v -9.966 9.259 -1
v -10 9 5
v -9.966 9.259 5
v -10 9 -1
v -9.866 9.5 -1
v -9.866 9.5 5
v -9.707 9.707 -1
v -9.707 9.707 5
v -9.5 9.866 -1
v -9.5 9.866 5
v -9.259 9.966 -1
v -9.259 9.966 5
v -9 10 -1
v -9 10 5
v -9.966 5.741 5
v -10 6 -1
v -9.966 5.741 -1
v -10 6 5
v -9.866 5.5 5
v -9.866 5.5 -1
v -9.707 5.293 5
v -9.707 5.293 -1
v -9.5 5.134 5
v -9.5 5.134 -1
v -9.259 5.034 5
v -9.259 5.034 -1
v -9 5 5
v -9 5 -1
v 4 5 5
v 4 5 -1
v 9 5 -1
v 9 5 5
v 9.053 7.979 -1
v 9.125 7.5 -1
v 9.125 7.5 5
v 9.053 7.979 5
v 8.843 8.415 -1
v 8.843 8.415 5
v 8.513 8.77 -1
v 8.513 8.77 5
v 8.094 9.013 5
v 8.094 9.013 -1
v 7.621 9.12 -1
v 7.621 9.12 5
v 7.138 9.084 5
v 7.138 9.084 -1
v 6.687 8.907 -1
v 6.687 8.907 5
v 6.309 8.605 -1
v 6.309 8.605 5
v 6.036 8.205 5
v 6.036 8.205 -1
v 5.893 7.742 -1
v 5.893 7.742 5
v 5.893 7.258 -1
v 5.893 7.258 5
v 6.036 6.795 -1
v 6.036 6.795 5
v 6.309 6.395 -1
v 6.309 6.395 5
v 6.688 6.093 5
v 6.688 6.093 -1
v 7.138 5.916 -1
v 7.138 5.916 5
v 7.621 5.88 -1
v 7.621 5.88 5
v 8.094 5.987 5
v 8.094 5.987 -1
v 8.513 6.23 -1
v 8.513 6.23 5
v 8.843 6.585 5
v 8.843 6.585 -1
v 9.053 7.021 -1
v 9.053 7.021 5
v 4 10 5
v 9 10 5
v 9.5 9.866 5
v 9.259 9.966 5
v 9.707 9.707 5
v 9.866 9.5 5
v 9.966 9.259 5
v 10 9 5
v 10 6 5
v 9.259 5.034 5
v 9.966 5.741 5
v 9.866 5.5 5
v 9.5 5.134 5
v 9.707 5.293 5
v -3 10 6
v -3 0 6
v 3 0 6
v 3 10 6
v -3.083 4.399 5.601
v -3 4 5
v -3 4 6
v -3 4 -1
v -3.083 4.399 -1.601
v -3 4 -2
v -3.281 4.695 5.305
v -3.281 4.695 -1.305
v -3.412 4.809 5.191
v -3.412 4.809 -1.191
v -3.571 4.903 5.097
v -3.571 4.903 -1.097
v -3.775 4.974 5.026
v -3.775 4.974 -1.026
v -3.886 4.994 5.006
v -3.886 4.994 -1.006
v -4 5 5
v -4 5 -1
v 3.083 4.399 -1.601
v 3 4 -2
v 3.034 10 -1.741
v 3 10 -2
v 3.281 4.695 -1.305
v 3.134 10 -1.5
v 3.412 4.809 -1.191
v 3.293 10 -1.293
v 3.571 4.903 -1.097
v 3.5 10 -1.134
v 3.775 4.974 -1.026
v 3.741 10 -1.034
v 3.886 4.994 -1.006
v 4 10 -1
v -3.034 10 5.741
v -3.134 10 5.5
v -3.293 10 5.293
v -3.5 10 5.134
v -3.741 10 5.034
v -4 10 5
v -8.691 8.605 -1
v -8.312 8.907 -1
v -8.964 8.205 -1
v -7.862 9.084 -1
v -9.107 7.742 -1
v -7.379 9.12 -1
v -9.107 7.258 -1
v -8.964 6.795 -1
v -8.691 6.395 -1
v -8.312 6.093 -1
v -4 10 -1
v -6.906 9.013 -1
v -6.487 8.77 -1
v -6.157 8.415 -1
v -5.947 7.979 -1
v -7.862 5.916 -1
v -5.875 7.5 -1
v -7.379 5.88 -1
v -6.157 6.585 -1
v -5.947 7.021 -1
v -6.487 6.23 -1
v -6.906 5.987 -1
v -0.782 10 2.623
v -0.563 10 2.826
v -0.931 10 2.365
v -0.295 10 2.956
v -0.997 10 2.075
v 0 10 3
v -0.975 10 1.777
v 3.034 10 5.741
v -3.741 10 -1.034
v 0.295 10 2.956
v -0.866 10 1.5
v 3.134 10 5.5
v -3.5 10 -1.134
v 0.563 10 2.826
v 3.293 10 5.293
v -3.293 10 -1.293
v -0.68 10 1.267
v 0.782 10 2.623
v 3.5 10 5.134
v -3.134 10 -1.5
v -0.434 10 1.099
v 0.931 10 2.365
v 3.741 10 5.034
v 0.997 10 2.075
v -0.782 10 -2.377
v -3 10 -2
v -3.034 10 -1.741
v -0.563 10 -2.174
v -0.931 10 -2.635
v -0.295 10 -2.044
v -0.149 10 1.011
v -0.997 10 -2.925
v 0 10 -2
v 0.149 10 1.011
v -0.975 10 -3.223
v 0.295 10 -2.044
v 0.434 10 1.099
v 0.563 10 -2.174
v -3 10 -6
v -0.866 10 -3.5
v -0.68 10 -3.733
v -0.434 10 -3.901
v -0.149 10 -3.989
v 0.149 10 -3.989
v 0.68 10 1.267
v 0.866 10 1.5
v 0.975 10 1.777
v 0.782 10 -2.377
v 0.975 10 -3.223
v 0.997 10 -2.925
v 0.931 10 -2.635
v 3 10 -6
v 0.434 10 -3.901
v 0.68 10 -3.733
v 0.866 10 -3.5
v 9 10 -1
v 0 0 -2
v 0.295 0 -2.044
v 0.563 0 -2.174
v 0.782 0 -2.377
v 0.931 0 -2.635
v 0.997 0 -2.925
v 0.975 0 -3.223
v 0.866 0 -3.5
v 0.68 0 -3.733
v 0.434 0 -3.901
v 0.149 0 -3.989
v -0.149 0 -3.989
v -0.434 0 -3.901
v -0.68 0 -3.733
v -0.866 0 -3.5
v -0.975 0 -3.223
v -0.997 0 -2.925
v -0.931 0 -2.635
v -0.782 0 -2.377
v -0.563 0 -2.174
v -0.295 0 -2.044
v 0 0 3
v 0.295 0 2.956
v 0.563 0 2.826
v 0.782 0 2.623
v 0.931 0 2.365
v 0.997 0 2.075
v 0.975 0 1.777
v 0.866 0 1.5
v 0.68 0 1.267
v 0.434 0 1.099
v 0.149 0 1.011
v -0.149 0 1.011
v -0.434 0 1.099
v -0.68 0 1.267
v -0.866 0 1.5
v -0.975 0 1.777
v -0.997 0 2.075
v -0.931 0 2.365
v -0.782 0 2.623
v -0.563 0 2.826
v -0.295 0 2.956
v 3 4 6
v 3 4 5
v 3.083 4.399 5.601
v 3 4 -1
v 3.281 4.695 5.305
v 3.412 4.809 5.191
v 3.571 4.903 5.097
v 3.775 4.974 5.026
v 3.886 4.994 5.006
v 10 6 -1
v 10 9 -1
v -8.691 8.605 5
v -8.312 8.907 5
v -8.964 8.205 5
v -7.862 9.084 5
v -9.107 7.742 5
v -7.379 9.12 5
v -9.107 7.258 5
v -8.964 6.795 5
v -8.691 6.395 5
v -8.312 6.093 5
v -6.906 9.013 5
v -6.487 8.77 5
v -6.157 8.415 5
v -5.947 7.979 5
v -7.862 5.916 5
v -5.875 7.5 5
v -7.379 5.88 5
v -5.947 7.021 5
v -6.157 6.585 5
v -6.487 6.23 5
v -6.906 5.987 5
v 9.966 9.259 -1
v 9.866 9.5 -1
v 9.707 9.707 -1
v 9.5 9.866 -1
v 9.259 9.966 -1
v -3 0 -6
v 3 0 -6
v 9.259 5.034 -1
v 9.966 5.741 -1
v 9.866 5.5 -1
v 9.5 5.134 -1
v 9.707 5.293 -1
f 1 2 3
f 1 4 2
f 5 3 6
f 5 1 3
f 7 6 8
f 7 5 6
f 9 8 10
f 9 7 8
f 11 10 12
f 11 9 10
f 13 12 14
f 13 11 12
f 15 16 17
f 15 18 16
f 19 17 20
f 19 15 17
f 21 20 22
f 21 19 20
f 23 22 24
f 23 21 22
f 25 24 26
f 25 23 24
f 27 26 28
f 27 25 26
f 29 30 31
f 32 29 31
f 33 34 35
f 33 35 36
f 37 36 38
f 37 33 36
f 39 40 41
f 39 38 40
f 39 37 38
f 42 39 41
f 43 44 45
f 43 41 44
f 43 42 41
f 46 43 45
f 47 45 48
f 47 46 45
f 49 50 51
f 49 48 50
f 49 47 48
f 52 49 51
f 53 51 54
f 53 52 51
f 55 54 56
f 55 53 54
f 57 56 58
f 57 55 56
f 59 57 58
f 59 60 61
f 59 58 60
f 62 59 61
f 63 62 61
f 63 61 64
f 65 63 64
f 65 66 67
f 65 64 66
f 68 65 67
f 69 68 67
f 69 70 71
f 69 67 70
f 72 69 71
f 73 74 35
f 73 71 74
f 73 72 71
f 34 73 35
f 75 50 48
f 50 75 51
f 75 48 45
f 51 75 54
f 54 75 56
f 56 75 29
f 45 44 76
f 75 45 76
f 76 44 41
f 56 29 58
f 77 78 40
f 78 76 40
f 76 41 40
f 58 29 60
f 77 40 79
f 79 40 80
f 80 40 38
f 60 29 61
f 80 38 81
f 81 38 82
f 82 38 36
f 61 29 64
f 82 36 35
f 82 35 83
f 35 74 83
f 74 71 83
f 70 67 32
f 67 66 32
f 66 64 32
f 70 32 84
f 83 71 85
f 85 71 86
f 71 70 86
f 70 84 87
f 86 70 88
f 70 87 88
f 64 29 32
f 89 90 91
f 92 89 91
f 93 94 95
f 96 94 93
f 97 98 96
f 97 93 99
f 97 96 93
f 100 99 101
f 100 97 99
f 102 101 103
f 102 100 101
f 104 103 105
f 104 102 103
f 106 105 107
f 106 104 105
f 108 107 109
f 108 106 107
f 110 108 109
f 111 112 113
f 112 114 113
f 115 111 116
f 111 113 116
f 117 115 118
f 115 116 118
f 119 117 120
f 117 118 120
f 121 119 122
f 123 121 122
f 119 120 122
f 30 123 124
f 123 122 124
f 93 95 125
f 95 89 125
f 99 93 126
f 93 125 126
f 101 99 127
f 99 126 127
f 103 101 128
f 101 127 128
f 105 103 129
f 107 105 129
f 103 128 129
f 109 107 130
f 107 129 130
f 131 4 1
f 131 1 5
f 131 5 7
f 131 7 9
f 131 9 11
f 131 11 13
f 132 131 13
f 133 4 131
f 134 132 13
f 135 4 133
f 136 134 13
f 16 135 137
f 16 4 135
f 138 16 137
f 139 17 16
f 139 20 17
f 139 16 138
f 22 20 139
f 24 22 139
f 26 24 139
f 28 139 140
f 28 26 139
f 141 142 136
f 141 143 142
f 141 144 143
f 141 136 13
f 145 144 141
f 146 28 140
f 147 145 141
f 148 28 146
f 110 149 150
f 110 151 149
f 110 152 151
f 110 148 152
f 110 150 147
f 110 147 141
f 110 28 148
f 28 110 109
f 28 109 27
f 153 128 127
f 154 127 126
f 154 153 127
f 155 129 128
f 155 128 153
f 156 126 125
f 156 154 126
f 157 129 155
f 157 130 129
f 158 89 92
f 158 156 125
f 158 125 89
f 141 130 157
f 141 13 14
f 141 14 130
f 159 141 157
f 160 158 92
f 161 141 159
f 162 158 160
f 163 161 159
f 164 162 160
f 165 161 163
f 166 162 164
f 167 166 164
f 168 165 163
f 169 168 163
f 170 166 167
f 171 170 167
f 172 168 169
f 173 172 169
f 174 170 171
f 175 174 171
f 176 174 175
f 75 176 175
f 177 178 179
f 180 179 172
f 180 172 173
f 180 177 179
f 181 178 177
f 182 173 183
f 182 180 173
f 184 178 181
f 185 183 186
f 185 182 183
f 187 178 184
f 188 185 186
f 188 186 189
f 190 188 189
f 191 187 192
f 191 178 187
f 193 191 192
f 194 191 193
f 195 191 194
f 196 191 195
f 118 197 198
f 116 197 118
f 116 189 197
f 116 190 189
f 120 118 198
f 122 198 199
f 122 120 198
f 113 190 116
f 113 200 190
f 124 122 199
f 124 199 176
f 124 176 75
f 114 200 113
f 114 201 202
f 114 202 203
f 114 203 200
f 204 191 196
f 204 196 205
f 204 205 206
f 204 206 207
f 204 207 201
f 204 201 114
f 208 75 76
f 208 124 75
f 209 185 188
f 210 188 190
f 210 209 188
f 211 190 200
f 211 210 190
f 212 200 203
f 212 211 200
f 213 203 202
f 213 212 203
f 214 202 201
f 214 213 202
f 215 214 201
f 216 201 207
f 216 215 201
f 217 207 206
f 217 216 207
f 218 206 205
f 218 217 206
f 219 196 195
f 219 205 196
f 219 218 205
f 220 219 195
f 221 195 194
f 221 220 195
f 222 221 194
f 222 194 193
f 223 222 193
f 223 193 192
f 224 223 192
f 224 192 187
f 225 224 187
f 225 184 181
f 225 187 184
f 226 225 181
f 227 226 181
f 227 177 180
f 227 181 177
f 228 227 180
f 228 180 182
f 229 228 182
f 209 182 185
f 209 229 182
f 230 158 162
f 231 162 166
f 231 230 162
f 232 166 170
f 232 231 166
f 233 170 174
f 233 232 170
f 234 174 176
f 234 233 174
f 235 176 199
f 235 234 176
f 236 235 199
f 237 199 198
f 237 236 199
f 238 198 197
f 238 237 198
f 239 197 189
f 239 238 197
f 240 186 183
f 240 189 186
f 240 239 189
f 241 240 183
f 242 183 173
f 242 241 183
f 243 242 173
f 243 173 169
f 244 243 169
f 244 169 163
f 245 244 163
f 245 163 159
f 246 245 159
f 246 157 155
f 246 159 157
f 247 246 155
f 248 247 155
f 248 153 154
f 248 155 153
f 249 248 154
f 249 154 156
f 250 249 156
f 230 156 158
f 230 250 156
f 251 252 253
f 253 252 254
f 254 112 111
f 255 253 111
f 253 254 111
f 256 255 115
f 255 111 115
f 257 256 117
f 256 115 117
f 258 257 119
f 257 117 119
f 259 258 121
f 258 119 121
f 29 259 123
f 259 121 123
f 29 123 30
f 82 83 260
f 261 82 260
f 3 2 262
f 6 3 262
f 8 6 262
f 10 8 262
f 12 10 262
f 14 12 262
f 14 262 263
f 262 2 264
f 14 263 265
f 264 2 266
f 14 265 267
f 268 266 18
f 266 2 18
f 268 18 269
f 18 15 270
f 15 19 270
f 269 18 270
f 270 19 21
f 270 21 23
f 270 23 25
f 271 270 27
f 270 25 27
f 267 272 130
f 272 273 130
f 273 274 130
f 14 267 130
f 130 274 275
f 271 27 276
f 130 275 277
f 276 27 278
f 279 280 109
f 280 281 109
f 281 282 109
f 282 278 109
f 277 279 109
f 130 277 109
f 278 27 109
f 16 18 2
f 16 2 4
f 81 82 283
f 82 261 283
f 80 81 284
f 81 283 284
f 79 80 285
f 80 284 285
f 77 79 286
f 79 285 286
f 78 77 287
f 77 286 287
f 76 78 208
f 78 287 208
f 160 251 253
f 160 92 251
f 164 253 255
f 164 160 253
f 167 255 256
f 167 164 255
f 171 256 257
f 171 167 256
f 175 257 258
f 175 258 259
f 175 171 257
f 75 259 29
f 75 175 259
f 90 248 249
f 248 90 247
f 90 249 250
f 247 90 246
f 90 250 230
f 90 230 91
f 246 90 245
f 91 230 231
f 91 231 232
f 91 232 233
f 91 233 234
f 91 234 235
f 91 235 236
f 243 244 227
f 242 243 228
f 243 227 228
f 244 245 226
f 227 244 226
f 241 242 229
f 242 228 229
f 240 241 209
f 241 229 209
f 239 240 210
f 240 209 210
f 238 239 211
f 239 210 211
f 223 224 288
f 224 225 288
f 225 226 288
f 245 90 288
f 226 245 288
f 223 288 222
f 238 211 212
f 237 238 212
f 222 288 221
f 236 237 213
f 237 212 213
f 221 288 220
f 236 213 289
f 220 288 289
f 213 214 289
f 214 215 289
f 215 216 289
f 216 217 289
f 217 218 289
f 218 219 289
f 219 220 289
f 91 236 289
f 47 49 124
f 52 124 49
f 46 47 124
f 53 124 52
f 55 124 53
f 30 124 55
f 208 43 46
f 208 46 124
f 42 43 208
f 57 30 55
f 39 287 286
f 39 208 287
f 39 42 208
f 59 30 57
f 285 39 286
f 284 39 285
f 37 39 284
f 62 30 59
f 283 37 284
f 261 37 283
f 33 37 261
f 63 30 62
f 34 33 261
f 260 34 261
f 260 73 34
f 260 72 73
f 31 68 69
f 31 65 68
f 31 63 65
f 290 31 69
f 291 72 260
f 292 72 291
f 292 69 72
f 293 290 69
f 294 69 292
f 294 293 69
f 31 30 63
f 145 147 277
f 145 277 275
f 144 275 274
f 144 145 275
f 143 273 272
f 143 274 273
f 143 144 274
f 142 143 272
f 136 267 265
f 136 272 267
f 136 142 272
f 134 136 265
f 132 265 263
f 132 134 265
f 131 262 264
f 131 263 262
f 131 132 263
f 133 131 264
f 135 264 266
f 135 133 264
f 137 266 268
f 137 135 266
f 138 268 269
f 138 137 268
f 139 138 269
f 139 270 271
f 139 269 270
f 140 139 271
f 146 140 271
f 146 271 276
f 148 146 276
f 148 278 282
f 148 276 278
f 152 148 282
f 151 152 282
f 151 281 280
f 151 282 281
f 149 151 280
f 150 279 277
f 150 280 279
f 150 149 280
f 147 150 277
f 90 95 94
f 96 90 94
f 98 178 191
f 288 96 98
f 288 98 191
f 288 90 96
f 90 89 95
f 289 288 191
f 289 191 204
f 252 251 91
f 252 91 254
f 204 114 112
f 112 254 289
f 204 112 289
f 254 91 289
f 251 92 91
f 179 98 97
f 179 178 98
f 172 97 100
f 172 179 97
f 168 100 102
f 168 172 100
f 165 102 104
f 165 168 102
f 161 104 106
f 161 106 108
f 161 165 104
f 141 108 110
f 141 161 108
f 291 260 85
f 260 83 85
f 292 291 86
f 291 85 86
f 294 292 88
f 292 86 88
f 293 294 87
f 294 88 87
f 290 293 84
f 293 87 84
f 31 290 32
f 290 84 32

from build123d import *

# Parameters (mm, degrees)
SKETCH2_W               = 6
SKETCH2_H               = 12
SKETCH2_W_2             = 20
SKETCH2_H_2             = 6
BOSS_EXTRUDE1_DEPTH     = 10
SKETCH6_R               = 1
CUT_EXTRUDE2_DEPTH      = 16.362291496
CUT_EXTRUDE4_DEPTH      = 16.362291496
CUT_EXTRUDE4_DEPTH_BACK = 16.362291496
SKETCH7_R               = 1.625
FILLET1_R               = 1


with BuildPart() as part:
    # Sketch2 → Boss-Extrude1 (new body)
    with BuildSketch(Plane(origin=(0, 0, 0), x_dir=(1, 0, 0), z_dir=(0, 1, 0))):
        Rectangle(SKETCH2_W, SKETCH2_H)
        with Locations((0, -2)):
            Rectangle(SKETCH2_W_2, SKETCH2_H_2)
    extrude(amount=BOSS_EXTRUDE1_DEPTH)

    # Sketch6 → Cut-Extrude2 (cut, through all)
    with BuildSketch(Plane(origin=(0, 0, 0), x_dir=(1, 0, 0), z_dir=(0, 1, 0))):
        with Locations(Location((0, 3, 0), (0, 0, 270))):
            Circle(SKETCH6_R)
        with Locations(Location((0, -2, 0), (0, 0, 270))):
            Circle(SKETCH6_R)
    extrude(amount=CUT_EXTRUDE2_DEPTH, mode=Mode.SUBTRACT)

    # Sketch7 → Cut-Extrude4 (cut, two sides: drawn at the far end of the back side and taken through both)
    with BuildSketch(Plane.XY.offset(-CUT_EXTRUDE4_DEPTH_BACK)):
        with Locations((-7.5, 7.5)):
            Circle(SKETCH7_R)
        with Locations((7.5, 7.5)):
            Circle(SKETCH7_R)
        with BuildLine():
            Line((-10, 0), (-3, 0))
            Line((-3, 0), (-3, 4))
            ThreePointArc((-3, 4), (-3.292893219, 4.707106781), (-4, 5))
            Line((-4, 5), (-10, 5))
            Line((-10, 5), (-10, 0))
        make_face()
        with BuildLine():
            Line((3, 0), (3, 4))
            ThreePointArc((3, 4), (3.292893219, 4.707106781), (4, 5))
            Line((4, 5), (10, 5))
            Line((10, 5), (10, 0))
            Line((10, 0), (3, 0))
        make_face()
    extrude(amount=CUT_EXTRUDE4_DEPTH + CUT_EXTRUDE4_DEPTH_BACK, mode=Mode.SUBTRACT)

    # Fillet1
    fillet1_edges = [part.edges().sort_by_distance(p)[0] for p in [
        (10, 5, 2),
        (10, 10, 2),
        (-10, 5, 2),
        (-10, 10, 2),
        (-3, 7, 5),
        (3, 7, 5),
        (3, 7, -1),
        (-3, 7, -1),
    ]]
    fillet(fillet1_edges, radius=FILLET1_R - 0.0001)  # a hair under: the kernel refuses the full size


solid = part.part
